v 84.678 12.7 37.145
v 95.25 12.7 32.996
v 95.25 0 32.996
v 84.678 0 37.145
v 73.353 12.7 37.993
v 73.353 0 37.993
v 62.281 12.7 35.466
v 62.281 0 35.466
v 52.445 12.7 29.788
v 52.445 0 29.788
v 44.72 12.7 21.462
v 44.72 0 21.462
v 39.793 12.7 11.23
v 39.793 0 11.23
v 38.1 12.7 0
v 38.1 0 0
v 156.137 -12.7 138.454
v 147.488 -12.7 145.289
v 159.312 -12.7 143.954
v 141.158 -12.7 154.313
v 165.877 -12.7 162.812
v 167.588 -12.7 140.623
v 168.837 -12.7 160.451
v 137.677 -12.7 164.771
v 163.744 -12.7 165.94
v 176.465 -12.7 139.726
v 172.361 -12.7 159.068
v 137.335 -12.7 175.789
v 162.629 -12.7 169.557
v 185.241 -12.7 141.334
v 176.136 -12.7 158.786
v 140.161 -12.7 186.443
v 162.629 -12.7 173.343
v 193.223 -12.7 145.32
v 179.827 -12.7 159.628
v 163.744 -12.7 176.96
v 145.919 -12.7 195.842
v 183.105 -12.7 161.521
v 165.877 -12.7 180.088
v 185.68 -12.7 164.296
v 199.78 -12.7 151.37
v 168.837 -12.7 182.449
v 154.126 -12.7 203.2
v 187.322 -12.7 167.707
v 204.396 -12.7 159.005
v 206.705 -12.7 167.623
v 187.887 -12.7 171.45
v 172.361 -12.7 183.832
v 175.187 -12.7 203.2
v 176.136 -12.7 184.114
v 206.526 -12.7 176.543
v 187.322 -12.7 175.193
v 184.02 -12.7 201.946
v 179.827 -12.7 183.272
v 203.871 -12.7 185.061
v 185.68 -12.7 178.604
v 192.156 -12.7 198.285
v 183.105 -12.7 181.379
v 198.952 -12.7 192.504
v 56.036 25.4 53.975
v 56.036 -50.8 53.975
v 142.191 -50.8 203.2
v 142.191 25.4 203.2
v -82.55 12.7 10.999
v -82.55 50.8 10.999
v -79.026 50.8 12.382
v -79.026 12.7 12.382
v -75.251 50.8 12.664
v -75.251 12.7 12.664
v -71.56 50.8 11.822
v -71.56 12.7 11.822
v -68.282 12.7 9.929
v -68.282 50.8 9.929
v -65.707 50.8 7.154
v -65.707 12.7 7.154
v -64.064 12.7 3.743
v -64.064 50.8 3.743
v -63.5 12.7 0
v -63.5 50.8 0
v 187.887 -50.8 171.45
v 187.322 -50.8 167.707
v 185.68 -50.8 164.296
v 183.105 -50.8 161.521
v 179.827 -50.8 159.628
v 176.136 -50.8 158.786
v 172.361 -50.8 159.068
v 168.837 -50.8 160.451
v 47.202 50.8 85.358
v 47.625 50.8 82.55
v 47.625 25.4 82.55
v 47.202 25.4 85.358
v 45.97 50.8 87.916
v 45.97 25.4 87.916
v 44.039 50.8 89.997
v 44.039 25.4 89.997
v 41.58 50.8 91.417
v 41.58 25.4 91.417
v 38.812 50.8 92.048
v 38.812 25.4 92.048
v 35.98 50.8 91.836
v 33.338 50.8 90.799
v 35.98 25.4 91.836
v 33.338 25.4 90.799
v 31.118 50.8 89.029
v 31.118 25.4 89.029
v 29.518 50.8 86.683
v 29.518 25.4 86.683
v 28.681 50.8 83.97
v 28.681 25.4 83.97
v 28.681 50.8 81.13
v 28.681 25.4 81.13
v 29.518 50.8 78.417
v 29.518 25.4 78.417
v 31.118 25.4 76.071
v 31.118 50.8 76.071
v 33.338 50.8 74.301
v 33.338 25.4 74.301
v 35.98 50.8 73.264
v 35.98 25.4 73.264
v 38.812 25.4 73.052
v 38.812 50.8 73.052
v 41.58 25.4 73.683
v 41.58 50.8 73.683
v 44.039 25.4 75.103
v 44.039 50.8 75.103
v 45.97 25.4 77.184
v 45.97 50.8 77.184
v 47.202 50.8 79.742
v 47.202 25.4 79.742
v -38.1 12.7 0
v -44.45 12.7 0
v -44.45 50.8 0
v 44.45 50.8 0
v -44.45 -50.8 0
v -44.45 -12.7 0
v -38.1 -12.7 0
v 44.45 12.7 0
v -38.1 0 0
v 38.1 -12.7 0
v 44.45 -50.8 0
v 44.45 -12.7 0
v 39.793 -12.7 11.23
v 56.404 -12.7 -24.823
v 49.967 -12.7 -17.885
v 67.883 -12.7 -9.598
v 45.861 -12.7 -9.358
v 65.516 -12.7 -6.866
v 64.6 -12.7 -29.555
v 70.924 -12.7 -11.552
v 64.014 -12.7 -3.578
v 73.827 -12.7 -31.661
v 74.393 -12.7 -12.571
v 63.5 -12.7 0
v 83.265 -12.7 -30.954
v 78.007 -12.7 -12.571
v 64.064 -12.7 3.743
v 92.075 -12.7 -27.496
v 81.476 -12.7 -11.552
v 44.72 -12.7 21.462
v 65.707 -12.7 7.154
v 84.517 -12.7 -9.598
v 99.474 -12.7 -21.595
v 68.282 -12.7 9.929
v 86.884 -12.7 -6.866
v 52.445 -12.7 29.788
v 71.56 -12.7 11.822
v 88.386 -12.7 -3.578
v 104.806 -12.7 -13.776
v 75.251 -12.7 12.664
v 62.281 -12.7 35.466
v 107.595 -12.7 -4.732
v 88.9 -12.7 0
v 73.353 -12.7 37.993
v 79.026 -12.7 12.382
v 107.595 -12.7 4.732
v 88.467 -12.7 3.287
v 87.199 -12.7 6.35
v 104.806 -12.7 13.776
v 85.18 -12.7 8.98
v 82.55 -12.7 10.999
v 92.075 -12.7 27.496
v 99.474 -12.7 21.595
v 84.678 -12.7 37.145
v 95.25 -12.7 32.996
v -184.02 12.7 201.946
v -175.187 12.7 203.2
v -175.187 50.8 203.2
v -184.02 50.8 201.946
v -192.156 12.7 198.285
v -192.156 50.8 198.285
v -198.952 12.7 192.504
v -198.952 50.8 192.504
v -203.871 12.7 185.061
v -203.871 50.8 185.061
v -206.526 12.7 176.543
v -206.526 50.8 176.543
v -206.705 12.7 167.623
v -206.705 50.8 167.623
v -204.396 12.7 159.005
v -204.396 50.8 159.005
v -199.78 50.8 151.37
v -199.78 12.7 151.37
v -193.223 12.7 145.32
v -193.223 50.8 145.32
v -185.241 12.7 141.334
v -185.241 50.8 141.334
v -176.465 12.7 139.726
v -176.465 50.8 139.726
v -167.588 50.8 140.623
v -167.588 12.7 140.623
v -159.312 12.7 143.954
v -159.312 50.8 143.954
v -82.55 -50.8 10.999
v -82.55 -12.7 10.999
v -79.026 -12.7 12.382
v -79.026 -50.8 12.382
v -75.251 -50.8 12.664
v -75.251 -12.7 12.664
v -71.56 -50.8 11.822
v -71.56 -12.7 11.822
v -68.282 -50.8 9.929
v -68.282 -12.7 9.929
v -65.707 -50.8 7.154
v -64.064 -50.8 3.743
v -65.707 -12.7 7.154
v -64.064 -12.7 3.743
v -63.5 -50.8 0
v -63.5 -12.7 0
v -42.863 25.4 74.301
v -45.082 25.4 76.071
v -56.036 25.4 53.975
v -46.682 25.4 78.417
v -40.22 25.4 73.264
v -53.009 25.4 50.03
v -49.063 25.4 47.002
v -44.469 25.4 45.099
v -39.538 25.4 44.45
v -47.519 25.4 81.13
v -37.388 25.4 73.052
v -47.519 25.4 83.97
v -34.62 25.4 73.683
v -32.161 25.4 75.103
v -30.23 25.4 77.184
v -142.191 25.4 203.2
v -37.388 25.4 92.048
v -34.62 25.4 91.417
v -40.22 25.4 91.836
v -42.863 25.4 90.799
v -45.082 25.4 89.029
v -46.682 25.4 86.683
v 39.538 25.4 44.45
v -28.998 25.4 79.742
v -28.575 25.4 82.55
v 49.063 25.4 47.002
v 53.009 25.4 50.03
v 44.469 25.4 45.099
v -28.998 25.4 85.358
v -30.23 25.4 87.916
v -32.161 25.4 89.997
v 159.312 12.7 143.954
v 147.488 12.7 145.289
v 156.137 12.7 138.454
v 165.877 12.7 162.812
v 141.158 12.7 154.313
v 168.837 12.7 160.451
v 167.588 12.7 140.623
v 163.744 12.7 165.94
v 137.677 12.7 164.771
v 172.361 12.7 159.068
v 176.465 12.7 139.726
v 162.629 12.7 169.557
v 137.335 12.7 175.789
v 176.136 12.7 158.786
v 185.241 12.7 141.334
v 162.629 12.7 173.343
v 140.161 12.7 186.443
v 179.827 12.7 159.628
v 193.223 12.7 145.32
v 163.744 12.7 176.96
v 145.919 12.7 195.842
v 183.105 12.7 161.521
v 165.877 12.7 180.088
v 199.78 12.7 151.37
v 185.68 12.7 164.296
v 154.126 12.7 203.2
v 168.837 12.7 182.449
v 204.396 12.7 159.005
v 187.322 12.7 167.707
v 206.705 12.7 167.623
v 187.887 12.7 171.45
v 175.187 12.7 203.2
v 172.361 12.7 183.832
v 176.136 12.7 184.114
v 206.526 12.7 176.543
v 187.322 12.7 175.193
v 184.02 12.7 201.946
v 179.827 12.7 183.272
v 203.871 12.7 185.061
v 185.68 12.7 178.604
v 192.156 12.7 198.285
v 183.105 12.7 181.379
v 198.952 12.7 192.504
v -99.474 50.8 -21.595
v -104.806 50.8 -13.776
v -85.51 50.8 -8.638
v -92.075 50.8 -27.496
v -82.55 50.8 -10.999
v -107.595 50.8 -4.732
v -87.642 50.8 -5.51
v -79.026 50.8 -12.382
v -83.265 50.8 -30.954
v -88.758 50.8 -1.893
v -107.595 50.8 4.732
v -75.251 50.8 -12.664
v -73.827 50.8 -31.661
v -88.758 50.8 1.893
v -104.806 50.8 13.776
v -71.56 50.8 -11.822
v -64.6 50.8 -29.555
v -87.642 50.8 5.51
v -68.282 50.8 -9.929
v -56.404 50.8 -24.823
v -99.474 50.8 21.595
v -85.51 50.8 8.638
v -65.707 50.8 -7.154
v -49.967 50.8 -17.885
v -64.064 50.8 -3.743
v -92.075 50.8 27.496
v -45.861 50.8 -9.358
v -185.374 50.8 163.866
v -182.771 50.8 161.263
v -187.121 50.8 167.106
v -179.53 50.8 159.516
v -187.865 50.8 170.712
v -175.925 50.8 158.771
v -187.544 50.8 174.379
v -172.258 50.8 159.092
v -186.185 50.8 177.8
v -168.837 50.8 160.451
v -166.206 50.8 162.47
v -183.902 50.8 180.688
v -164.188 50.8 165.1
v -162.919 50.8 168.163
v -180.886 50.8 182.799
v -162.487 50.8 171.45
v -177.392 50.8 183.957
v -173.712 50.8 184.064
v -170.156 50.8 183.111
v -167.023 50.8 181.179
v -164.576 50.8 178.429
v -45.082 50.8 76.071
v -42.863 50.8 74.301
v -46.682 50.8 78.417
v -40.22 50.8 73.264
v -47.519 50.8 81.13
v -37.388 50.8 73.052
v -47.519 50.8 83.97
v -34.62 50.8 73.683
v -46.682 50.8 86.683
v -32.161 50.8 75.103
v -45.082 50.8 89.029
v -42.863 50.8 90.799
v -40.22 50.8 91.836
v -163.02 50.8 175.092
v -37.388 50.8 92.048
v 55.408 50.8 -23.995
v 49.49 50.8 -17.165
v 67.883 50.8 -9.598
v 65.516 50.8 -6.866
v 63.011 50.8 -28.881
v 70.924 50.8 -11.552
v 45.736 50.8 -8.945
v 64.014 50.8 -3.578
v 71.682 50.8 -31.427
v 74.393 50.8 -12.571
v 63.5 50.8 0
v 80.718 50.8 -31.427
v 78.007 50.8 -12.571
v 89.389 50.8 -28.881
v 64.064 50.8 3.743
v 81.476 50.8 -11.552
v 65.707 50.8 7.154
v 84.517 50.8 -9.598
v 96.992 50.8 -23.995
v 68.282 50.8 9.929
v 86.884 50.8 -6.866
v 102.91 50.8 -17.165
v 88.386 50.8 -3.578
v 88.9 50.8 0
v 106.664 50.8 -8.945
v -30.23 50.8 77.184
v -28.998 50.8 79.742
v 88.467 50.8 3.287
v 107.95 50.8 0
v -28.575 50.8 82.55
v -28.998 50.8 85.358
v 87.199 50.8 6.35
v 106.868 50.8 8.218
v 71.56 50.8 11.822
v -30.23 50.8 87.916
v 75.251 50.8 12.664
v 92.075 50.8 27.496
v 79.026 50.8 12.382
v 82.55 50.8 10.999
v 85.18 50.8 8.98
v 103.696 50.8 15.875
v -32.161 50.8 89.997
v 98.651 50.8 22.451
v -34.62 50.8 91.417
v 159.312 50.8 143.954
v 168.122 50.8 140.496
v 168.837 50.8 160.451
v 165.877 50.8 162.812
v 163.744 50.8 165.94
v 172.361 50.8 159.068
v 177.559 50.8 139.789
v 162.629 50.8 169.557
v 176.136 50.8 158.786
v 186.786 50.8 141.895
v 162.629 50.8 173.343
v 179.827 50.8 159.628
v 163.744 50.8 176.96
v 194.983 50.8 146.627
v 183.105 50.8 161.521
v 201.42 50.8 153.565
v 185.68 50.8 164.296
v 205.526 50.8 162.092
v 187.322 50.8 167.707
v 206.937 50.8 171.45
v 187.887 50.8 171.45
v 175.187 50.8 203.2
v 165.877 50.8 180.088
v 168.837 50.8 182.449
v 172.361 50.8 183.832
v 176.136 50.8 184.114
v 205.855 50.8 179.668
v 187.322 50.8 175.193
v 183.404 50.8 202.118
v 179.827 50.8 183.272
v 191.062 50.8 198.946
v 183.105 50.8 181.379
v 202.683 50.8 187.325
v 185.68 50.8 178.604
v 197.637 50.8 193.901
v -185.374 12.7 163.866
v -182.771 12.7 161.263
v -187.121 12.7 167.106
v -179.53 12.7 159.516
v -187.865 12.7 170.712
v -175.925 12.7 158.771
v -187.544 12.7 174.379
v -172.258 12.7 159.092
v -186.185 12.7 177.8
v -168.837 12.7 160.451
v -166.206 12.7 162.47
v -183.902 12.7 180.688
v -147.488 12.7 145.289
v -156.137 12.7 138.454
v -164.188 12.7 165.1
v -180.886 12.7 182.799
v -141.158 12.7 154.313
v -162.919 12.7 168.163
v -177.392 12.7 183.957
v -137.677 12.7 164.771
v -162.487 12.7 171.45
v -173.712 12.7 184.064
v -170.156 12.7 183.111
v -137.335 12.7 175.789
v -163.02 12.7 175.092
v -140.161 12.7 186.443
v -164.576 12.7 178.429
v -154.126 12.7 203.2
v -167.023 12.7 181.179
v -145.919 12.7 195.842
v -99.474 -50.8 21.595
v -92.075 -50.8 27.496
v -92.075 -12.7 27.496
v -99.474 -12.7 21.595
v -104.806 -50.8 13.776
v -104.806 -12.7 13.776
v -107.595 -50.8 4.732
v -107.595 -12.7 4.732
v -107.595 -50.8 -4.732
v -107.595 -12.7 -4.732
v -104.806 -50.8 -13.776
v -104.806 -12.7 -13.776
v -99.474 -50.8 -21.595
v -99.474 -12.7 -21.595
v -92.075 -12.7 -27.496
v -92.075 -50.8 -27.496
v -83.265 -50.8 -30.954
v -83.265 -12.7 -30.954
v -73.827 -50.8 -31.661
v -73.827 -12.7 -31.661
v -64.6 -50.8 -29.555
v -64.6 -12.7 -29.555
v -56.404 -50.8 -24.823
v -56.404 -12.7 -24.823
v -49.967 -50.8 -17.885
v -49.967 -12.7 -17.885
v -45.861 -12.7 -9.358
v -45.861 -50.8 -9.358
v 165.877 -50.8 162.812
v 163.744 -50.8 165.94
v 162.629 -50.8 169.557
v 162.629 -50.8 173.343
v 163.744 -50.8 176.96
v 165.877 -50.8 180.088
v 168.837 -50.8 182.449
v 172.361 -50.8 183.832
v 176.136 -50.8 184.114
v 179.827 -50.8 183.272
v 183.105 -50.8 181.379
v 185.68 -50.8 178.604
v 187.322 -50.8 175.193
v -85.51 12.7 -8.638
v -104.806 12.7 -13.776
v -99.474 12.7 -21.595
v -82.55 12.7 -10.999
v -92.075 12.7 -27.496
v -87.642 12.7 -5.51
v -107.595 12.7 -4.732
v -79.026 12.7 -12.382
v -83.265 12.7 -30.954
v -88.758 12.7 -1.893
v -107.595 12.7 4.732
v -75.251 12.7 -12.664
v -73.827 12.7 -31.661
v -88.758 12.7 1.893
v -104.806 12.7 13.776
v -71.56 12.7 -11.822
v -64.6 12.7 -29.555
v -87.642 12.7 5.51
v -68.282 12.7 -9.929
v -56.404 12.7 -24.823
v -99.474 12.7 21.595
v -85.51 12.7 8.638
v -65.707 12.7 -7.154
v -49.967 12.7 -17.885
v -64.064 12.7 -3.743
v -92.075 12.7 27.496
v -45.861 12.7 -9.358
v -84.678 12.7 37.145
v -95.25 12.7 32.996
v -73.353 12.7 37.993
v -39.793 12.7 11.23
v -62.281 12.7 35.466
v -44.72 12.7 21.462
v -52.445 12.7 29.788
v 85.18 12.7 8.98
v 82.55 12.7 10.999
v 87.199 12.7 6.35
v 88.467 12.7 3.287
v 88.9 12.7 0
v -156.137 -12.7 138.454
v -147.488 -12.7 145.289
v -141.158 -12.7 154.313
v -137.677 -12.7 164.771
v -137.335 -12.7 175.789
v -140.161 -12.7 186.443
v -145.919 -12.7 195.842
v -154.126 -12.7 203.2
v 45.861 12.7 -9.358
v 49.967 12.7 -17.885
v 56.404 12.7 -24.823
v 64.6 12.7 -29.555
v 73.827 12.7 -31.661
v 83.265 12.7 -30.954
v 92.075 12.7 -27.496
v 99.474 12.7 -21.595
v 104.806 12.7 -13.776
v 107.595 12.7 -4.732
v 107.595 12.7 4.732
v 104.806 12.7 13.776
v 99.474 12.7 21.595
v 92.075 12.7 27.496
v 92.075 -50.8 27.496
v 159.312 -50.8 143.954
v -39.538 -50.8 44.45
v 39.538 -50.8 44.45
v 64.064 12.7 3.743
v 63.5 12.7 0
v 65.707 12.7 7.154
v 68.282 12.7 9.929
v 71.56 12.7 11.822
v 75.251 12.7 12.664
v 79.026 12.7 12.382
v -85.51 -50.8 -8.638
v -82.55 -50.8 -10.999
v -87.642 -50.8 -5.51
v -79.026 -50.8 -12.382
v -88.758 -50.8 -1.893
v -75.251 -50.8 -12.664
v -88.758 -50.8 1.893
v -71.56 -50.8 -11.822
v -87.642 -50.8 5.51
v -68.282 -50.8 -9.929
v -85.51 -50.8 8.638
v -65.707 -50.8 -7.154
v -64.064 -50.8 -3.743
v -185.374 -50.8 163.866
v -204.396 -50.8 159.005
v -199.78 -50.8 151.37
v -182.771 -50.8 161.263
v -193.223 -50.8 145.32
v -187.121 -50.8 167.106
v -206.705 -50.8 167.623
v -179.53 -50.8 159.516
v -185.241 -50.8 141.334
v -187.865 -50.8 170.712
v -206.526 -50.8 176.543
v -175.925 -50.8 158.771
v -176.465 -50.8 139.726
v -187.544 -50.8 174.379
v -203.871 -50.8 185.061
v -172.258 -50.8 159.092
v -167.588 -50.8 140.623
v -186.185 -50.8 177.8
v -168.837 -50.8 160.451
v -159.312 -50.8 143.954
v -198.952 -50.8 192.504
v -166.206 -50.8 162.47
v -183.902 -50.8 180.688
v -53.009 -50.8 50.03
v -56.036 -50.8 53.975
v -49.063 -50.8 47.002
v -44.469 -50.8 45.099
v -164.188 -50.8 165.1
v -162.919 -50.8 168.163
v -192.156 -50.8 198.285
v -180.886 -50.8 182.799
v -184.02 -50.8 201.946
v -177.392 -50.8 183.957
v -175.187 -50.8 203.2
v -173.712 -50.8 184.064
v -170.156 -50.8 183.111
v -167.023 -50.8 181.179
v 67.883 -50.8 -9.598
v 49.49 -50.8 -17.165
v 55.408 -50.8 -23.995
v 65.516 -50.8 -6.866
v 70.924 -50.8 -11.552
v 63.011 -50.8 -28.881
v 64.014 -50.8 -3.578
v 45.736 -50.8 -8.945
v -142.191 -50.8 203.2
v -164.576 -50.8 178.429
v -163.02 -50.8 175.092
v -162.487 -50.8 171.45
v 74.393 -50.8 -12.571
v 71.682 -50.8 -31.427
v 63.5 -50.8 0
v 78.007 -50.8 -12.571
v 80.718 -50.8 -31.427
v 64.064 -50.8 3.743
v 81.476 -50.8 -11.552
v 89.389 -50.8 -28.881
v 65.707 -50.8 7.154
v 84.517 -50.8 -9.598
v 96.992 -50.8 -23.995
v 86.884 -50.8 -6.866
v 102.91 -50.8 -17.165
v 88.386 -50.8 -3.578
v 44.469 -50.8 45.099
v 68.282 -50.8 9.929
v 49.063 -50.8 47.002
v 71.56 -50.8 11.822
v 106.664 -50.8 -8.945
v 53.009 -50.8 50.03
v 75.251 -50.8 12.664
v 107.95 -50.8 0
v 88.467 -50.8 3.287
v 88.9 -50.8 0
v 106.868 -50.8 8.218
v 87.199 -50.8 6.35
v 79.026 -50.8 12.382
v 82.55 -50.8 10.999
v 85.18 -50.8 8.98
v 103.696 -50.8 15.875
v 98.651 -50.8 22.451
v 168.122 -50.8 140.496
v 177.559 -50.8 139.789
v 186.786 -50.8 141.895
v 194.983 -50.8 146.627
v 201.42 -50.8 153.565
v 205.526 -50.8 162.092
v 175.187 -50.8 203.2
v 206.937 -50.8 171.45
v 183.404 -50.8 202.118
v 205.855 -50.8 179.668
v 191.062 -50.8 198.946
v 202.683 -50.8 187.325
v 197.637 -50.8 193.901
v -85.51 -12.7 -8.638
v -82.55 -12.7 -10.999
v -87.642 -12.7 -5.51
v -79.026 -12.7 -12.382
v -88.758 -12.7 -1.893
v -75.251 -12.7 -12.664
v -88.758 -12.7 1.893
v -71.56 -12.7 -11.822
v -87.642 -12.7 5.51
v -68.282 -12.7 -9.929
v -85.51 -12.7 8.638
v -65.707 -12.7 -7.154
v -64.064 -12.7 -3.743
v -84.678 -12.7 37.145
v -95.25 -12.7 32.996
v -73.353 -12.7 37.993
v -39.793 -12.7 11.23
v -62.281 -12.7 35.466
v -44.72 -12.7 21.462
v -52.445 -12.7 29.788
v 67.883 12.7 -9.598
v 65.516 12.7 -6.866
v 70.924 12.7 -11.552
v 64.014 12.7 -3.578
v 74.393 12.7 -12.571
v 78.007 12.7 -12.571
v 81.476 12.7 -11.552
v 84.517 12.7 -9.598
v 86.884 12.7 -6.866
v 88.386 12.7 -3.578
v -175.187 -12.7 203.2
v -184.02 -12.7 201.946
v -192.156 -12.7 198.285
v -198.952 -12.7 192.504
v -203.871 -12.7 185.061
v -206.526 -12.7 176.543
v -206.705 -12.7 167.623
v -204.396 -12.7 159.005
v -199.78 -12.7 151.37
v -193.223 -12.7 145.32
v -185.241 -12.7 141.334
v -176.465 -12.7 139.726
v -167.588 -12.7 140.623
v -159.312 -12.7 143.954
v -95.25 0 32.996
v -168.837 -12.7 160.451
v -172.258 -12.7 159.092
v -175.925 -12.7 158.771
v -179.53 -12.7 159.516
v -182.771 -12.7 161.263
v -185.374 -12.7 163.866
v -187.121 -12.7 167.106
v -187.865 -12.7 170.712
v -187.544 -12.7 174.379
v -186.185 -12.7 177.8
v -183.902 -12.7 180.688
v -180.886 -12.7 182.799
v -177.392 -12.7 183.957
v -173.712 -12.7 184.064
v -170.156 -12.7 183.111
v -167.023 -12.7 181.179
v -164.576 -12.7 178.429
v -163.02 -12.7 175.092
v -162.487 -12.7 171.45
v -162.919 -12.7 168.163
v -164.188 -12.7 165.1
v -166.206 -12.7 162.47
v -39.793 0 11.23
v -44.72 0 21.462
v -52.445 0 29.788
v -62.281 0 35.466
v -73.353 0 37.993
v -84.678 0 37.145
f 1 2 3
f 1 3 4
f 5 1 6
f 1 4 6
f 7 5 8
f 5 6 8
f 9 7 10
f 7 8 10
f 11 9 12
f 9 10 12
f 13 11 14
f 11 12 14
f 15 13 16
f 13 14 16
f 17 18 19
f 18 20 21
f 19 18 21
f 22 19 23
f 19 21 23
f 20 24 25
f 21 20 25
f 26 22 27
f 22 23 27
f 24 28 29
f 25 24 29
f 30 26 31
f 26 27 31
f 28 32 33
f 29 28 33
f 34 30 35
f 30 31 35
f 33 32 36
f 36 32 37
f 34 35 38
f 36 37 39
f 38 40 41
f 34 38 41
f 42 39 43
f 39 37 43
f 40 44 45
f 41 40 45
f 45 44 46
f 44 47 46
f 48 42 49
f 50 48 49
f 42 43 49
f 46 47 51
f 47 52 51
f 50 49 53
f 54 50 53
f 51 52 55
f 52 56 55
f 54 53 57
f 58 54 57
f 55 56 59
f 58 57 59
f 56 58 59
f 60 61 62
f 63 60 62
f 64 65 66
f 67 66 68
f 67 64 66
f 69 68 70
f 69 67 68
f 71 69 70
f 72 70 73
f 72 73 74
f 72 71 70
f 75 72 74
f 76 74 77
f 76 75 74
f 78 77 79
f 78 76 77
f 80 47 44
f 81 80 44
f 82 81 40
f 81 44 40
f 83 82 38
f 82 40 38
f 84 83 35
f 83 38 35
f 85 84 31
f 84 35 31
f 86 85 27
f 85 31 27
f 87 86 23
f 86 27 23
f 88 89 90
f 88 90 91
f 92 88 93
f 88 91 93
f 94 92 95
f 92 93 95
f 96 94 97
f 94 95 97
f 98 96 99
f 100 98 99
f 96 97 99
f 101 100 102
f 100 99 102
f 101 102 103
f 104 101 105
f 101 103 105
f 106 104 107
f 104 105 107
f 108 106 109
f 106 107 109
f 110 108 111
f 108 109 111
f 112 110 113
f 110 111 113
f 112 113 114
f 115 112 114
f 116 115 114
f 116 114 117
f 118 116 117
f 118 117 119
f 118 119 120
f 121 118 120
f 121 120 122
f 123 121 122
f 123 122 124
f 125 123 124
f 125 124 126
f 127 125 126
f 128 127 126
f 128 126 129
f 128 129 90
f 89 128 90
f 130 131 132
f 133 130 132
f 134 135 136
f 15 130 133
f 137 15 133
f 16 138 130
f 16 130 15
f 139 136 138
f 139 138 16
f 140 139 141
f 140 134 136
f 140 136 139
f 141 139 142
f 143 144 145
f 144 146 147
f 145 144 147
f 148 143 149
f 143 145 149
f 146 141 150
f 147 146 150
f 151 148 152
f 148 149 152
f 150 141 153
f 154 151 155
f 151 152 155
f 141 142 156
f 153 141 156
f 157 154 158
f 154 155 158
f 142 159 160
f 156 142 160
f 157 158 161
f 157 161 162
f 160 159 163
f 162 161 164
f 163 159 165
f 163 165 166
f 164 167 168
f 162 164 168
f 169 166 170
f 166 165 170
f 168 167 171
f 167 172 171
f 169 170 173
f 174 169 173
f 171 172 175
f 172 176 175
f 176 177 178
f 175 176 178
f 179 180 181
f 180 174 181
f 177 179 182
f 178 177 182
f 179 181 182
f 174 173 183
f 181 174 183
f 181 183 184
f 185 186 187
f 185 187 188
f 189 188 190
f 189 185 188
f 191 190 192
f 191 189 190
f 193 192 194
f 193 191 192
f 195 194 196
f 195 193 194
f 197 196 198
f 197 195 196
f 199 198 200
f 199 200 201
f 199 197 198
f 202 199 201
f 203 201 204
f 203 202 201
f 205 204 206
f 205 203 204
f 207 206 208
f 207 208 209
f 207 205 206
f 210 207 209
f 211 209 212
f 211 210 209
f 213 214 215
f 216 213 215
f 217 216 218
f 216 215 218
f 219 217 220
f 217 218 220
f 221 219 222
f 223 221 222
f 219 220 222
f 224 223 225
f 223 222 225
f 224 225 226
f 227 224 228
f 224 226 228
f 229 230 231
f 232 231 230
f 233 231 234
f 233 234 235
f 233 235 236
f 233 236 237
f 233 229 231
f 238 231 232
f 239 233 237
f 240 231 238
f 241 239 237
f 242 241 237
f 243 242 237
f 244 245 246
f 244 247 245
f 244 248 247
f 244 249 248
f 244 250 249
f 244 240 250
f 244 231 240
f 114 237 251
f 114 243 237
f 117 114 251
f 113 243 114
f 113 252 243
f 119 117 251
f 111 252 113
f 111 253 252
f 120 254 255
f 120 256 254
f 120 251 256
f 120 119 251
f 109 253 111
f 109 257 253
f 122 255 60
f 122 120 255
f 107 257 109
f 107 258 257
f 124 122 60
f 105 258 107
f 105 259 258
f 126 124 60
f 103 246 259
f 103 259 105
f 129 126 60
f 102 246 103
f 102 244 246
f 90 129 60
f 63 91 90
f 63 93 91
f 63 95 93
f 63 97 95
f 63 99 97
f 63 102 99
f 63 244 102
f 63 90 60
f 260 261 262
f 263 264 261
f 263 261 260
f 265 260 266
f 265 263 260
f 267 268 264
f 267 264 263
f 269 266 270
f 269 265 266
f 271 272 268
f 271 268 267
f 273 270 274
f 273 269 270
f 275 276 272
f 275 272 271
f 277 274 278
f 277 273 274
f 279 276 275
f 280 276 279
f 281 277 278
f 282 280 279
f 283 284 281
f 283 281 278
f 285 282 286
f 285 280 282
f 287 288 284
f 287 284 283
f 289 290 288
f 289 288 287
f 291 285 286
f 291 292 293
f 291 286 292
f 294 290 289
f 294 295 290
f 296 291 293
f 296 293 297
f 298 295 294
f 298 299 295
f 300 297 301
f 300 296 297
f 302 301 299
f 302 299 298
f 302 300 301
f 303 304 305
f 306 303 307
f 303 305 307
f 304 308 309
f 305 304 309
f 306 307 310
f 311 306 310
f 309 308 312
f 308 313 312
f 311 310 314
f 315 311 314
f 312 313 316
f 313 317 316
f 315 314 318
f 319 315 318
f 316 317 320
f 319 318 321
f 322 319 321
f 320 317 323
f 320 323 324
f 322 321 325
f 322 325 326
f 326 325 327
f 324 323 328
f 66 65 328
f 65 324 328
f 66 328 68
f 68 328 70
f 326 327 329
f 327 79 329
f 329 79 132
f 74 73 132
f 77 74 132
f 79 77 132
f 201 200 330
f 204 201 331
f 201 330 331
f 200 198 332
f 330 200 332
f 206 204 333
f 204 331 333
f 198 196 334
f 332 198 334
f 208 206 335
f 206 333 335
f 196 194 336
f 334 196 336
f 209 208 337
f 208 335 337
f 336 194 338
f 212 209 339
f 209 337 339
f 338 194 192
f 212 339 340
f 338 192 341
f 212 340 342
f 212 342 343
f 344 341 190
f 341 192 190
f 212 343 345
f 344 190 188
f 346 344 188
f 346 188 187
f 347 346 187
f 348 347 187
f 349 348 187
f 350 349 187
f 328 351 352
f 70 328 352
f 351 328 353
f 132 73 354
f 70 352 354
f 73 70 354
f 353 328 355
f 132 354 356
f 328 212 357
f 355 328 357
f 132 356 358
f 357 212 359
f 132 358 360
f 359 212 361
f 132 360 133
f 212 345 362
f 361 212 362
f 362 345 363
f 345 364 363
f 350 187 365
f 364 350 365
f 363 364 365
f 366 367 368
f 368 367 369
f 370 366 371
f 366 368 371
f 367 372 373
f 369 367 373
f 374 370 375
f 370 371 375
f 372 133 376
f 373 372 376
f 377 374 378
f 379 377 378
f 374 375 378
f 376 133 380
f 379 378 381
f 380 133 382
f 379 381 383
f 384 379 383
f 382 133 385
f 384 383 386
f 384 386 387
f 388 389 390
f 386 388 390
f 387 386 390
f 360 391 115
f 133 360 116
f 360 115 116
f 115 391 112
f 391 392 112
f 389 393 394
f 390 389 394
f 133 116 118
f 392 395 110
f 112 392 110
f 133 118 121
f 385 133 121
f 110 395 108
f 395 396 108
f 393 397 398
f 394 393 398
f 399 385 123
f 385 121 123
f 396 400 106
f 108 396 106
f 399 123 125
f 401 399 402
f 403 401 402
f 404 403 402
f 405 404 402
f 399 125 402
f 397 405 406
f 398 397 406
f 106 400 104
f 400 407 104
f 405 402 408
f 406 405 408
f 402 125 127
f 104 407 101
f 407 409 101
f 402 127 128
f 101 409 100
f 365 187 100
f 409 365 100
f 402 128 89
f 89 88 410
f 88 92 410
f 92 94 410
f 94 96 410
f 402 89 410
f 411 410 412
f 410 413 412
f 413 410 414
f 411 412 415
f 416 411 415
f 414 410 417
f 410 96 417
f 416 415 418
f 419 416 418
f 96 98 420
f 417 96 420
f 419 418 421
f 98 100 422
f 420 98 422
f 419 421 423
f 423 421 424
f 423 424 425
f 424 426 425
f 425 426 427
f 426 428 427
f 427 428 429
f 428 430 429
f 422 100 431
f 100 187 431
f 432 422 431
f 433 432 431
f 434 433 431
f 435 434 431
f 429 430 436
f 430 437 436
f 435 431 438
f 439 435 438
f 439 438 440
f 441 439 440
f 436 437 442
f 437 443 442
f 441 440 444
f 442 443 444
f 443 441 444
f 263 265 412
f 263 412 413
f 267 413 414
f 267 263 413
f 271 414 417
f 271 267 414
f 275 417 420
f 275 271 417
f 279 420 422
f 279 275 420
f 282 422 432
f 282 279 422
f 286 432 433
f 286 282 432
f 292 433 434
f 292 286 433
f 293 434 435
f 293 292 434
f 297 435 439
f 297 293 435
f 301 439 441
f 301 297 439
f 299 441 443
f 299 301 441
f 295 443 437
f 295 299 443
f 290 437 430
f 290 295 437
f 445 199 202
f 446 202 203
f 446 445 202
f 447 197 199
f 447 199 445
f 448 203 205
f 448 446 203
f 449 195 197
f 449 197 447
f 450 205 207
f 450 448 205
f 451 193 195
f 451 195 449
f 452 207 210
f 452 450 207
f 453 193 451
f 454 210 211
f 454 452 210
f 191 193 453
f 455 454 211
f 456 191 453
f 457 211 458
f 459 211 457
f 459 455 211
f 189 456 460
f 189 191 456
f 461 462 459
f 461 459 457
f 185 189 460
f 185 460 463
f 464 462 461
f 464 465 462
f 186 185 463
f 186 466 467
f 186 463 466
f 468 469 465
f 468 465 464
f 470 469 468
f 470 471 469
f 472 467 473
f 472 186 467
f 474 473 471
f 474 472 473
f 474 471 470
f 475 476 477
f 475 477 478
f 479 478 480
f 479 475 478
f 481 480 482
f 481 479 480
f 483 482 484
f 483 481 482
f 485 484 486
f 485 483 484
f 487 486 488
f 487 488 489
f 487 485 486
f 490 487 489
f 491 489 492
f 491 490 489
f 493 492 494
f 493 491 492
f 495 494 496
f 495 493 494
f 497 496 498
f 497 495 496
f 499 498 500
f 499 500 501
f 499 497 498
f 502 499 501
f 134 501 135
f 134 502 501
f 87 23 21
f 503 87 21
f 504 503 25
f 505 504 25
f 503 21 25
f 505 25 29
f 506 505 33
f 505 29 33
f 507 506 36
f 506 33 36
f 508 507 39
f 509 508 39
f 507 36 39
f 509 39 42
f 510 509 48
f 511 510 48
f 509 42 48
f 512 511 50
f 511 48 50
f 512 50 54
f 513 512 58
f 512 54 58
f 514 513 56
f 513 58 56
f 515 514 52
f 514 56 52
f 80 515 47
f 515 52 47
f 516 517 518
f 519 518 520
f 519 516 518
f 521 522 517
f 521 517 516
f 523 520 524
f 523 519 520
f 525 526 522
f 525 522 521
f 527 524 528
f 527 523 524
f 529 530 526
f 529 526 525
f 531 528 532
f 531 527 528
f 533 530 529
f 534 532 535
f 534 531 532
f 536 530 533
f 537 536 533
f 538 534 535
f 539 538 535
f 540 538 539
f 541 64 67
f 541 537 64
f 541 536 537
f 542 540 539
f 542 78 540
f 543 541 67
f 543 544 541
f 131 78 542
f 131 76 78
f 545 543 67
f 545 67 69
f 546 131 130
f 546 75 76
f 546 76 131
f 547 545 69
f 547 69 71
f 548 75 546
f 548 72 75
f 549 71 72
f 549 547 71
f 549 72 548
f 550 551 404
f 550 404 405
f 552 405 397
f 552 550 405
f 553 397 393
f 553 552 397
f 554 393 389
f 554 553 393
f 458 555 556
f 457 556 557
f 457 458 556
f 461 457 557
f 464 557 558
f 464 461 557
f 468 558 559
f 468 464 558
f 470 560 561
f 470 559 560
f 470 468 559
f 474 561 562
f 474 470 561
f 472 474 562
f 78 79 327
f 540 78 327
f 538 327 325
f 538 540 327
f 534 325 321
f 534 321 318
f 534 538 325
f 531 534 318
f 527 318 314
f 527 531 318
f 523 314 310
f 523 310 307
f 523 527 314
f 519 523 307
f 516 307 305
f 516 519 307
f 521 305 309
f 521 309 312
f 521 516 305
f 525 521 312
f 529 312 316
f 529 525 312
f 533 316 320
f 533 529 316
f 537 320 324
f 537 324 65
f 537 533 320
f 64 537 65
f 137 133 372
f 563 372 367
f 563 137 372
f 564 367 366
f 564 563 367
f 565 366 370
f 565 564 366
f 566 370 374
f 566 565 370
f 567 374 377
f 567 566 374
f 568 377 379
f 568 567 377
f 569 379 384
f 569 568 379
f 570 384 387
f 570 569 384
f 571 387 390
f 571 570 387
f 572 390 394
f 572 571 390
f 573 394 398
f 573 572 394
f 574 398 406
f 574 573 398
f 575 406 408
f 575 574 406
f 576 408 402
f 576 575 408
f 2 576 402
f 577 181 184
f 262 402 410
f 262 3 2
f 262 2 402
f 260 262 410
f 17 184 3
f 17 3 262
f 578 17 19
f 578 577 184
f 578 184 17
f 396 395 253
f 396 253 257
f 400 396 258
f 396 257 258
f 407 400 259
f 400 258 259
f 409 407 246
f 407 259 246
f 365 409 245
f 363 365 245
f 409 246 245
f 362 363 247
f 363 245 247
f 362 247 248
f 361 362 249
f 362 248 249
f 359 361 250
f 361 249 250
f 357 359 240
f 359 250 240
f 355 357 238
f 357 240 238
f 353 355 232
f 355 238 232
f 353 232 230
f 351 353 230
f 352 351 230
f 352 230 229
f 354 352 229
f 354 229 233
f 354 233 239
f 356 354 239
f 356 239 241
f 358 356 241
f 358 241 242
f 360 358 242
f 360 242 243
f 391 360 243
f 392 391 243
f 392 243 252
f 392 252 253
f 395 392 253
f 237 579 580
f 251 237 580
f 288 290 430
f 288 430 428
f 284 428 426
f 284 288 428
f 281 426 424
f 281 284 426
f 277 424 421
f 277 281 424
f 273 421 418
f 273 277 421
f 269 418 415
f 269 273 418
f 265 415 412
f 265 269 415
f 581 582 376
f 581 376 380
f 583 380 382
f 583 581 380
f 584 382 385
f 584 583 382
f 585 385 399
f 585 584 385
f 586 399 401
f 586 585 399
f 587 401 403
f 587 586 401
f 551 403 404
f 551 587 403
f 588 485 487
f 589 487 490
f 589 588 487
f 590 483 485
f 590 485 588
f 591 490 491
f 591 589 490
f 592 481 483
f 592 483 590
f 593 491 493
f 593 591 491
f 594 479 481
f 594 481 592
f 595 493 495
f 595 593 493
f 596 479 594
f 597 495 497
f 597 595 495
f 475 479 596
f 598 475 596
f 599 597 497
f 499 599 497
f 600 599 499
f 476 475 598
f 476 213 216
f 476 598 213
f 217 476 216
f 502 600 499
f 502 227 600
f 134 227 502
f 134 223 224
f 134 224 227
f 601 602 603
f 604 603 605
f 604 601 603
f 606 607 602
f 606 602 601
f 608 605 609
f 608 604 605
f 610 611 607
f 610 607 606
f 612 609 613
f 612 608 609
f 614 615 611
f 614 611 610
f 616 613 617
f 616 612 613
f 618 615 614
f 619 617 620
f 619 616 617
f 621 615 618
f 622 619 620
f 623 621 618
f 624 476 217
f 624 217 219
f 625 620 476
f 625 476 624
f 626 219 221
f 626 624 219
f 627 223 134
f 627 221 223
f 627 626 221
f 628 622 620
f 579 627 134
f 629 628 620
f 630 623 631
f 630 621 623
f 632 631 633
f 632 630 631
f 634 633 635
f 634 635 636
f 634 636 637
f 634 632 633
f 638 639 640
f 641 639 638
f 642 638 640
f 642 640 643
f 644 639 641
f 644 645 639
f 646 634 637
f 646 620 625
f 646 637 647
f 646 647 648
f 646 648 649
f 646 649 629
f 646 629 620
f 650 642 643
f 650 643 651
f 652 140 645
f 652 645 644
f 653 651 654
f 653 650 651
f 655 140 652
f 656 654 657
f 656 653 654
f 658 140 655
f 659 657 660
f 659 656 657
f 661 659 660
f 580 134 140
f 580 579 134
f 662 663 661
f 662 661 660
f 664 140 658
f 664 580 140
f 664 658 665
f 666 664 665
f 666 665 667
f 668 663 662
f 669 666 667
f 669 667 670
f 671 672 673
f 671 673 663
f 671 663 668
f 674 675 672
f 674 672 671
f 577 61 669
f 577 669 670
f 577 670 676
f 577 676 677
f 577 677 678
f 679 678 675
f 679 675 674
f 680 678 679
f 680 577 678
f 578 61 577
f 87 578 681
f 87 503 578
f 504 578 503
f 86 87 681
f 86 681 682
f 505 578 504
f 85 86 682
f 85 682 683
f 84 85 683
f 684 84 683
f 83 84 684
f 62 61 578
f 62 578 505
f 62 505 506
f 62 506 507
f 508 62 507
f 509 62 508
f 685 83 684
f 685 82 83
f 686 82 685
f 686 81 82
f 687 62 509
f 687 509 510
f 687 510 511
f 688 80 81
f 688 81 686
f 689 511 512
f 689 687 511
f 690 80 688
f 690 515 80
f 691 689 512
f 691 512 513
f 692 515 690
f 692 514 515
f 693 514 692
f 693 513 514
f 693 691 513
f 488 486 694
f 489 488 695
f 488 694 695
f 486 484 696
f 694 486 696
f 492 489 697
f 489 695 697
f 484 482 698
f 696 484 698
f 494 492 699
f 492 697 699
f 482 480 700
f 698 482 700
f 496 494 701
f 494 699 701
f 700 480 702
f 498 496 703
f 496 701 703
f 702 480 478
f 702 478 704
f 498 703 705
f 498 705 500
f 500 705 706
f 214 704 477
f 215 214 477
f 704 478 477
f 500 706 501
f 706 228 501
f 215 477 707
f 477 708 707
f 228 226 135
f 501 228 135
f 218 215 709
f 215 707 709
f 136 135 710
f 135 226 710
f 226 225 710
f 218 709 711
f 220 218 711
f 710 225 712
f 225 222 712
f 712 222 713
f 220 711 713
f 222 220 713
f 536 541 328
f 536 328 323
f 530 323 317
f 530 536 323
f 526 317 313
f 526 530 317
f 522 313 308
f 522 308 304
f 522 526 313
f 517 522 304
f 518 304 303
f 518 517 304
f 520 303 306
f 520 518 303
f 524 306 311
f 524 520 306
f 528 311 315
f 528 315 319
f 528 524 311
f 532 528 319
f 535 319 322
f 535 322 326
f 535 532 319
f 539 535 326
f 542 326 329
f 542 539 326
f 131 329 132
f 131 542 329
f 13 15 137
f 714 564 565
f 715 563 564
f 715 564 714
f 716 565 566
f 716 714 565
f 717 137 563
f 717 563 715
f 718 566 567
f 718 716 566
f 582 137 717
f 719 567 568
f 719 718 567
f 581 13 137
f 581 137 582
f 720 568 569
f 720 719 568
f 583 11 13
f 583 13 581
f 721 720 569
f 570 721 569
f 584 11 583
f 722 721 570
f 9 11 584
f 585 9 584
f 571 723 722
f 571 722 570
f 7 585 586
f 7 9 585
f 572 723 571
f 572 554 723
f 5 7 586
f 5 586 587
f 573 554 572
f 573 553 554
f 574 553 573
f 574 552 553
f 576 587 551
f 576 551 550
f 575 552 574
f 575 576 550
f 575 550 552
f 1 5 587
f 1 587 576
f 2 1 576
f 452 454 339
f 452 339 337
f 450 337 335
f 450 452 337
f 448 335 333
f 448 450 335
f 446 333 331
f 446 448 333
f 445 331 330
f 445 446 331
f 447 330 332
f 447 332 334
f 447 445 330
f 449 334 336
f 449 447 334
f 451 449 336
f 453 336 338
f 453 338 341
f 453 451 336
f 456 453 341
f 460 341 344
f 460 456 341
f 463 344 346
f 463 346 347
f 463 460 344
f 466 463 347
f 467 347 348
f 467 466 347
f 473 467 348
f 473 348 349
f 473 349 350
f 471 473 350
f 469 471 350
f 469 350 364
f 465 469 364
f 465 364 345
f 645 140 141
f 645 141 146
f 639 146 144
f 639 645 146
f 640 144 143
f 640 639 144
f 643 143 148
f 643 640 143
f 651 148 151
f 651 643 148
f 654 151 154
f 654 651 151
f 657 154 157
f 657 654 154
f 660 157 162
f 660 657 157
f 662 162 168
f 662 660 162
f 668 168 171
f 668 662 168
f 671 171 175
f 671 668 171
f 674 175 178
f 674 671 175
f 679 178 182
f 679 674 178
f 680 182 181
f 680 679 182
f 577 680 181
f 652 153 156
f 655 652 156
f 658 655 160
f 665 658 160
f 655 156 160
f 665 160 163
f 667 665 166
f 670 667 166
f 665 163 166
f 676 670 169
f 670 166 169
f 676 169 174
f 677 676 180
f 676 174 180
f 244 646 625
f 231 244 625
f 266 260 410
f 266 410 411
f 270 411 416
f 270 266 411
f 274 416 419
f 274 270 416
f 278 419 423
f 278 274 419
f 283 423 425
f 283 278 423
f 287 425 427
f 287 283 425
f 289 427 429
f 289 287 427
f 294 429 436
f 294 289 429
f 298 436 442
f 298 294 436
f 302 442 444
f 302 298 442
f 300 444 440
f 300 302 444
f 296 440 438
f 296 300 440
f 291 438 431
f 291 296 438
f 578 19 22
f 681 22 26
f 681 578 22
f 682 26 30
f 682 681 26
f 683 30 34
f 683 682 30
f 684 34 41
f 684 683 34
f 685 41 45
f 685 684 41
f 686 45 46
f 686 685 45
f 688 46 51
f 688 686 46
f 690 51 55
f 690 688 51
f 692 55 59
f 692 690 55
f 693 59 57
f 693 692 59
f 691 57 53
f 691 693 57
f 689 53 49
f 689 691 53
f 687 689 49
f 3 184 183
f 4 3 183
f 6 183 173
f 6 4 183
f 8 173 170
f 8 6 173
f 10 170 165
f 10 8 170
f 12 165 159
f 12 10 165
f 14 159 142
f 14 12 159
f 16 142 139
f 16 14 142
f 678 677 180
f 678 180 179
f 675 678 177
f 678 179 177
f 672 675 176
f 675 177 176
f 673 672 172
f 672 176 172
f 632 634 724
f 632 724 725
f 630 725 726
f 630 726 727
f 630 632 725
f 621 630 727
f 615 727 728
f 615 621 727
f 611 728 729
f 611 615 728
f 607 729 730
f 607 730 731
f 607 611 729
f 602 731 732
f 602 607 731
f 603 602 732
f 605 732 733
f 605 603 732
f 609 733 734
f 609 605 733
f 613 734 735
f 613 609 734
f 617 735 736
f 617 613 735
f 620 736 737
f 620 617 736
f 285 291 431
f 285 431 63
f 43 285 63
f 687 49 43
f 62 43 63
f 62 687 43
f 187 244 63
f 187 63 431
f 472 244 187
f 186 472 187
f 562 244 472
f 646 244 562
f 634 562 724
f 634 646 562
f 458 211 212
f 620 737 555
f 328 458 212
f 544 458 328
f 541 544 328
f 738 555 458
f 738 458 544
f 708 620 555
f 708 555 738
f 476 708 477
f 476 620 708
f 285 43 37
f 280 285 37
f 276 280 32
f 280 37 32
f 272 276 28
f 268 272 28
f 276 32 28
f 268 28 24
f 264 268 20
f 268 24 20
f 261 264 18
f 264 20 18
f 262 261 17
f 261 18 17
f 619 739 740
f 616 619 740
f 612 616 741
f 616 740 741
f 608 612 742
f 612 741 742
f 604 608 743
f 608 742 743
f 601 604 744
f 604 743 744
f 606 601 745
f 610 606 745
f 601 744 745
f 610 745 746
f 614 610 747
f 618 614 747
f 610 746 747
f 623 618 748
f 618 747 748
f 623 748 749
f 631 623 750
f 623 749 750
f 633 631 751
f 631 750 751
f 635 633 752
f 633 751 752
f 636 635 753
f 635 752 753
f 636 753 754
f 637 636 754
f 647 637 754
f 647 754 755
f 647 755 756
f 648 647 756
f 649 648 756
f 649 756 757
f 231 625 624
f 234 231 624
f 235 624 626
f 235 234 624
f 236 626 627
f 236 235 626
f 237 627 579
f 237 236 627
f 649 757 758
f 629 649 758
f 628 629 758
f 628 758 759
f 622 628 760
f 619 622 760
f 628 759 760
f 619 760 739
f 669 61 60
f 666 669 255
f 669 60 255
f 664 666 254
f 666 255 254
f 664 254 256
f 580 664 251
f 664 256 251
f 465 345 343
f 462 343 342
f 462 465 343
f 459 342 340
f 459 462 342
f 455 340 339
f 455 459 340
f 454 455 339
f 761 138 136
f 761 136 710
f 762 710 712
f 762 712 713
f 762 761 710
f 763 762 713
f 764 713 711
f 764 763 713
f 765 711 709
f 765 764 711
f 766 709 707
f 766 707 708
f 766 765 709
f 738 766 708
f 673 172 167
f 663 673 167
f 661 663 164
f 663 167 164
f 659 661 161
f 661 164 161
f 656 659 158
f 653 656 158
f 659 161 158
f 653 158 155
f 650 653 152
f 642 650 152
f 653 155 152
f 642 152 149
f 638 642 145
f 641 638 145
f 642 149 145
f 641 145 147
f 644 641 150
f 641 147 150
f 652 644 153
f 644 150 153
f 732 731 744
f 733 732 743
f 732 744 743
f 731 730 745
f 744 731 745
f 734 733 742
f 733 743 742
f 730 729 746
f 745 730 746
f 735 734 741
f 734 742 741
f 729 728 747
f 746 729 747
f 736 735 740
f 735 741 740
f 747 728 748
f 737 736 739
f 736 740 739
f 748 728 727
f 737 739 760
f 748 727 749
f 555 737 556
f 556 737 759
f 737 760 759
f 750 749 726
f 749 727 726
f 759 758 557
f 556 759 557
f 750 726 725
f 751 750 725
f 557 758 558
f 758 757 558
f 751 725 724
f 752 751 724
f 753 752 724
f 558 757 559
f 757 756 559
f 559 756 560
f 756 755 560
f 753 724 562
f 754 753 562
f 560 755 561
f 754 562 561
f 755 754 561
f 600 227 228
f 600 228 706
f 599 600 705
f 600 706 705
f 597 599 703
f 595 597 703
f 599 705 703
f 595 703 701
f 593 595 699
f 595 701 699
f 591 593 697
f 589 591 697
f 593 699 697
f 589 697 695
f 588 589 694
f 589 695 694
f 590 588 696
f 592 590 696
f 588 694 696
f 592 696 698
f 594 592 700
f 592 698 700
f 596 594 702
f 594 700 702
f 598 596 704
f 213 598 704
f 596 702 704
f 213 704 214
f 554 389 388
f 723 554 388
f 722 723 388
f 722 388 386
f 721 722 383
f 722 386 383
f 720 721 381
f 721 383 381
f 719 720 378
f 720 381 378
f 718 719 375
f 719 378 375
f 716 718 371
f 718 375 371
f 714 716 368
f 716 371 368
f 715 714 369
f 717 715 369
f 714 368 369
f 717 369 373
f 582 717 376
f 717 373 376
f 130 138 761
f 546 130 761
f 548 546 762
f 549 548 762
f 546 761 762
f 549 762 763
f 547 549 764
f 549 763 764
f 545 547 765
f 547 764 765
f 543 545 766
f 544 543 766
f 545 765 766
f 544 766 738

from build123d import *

# Parameters (mm, degrees)
F1_DEPTH = 50.8
F3_DEPTH = 76.2
F4_R     = 38.1
F5_DEPTH = 12.7
F6_R     = 9.525
F7_DEPTH = 25.401
F8_R     = 19.05


with BuildPart() as f1:
    # F0 (on Front) → F1 (new body, symmetric)
    with BuildSketch(Plane.XZ):
        with BuildLine():
            ThreePointArc((-143.4367036526, 171.45), (-152.7360633499, 193.9006403027), (-175.1867036526, 203.2))
            ThreePointArc((-175.1867036526, 203.2), (-205.8548486372, 163.232495318), (-159.3117036526, 143.9536934298))
            ThreePointArc((-159.3117036526, 143.9536934298), (-147.6903970824, 155.575), (-143.4367036526, 171.45))
        make_face()
        with BuildLine():
            ThreePointArc((-162.4867036526, 171.45), (-164.1881810245, 165.1), (-168.8367036526, 160.4514773719))
            ThreePointArc((-168.8367036526, 160.4514773719), (-186.1852262806, 177.8), (-162.4867036526, 171.45))
        make_face(mode=Mode.SUBTRACT)
        with BuildLine():
            Line((92.075, 27.4963065702), (159.3117036526, 143.9536934298))
            ThreePointArc((159.3117036526, 143.9536934298), (144.5185586679, 179.667504682), (175.1867036526, 203.2))
            Line((175.1867036526, 203.2), (-175.1867036526, 203.2))
            ThreePointArc((-175.1867036526, 203.2), (-152.7360633499, 193.9006403027), (-143.4367036526, 171.45))
            ThreePointArc((-143.4367036526, 171.45), (-147.6903970824, 155.575), (-159.3117036526, 143.9536934298))
            Line((-159.3117036526, 143.9536934298), (-92.075, 27.4963065702))
            ThreePointArc((-92.075, 27.4963065702), (-60.325, 27.4963065702), (-44.45, 0))
            Line((-44.45, 0), (44.45, 0))
            ThreePointArc((44.45, 0), (60.325, 27.4963065702), (92.075, 27.4963065702))
        make_face()
        with BuildLine():
            ThreePointArc((175.1867036526, 203.2), (144.5185586679, 179.667504682), (159.3117036526, 143.9536934298))
            ThreePointArc((159.3117036526, 143.9536934298), (191.0617036526, 143.9536934298), (206.9367036526, 171.45))
            ThreePointArc((206.9367036526, 171.45), (197.6373439552, 193.9006403027), (175.1867036526, 203.2))
        make_face()
        with BuildLine():
            ThreePointArc((187.8867036526, 171.45), (181.5367036526, 160.4514773719), (168.8367036526, 160.4514773719))
            ThreePointArc((168.8367036526, 160.4514773719), (168.8367036526, 182.4485226281), (187.8867036526, 171.45))
        make_face(mode=Mode.SUBTRACT)
        with BuildLine():
            ThreePointArc((107.95, 0), (103.6963065702, 15.875), (92.075, 27.4963065702))
            Line((92.075, 27.4963065702), (82.55, 10.9985226281))
            ThreePointArc((82.55, 10.9985226281), (87.1985226281, 6.35), (88.9, 0))
            ThreePointArc((88.9, 0), (76.2, -12.7), (63.5, 0))
            Line((63.5, 0), (44.45, 0))
            ThreePointArc((44.45, 0), (76.2, -31.75), (107.95, 0))
        make_face()
        with BuildLine():
            Line((82.55, 10.9985226281), (92.075, 27.4963065702))
            ThreePointArc((92.075, 27.4963065702), (60.325, 27.4963065702), (44.45, 0))
            Line((44.45, 0), (63.5, 0))
            ThreePointArc((63.5, 0), (69.85, 10.9985226281), (82.55, 10.9985226281))
        make_face()
        with BuildLine():
            Line((-63.5, 0), (-44.45, 0))
            ThreePointArc((-44.45, 0), (-60.325, 27.4963065702), (-92.075, 27.4963065702))
            Line((-92.075, 27.4963065702), (-82.55, 10.9985226281))
            ThreePointArc((-82.55, 10.9985226281), (-69.85, 10.9985226281), (-63.5, 0))
        make_face()
        with BuildLine():
            ThreePointArc((-92.075, 27.4963065702), (-92.075, -27.4963065702), (-44.45, 0))
            Line((-44.45, 0), (-63.5, 0))
            ThreePointArc((-63.5, 0), (-82.55, -10.9985226281), (-82.55, 10.9985226281))
            Line((-82.55, 10.9985226281), (-92.075, 27.4963065702))
        make_face()
    extrude(amount=F1_DEPTH, both=True)

    # F2 (on face) → F3 (cut)
    with BuildSketch(Plane.XZ.offset(50.8)):
        Polygon((-50.5367805345, 44.45), (0, 44.45), (50.5367805345, 44.45), (142.1911357684, 203.2), (-142.1911357684, 203.2), align=None)
    extrude(amount=-F3_DEPTH, mode=Mode.SUBTRACT)

    # F4 (on Front) → F5 (cut, symmetric)
    with BuildSketch(Plane.XZ):
        with Locations((-175.1867036526, 171.45)):
            Circle(F4_R)
        with Locations((-76.2, 0)):
            Circle(F4_R)
        with Locations((76.2, 0)):
            Circle(F4_R)
        with Locations((175.1867036526, 171.45)):
            Circle(F4_R)
    extrude(amount=F5_DEPTH, both=True, mode=Mode.SUBTRACT)

    # F6 (on face) → F7 (cut, through all)
    with BuildSketch(Plane.XZ.offset(-25.4)):
        with Locations((38.1, 82.55)):
            Circle(F6_R)
        with Locations((-38.1, 82.55)):
            Circle(F6_R)
    extrude(amount=-F7_DEPTH, mode=Mode.SUBTRACT)

    # F8
    f8_edges = [f1.edges().sort_by_distance(p)[0] for p in [
        (-50.536781, -12.7, 44.45),
        (50.536781, -12.7, 44.45),
    ]]
    fillet(f8_edges, radius=F8_R)


solid = f1.part
